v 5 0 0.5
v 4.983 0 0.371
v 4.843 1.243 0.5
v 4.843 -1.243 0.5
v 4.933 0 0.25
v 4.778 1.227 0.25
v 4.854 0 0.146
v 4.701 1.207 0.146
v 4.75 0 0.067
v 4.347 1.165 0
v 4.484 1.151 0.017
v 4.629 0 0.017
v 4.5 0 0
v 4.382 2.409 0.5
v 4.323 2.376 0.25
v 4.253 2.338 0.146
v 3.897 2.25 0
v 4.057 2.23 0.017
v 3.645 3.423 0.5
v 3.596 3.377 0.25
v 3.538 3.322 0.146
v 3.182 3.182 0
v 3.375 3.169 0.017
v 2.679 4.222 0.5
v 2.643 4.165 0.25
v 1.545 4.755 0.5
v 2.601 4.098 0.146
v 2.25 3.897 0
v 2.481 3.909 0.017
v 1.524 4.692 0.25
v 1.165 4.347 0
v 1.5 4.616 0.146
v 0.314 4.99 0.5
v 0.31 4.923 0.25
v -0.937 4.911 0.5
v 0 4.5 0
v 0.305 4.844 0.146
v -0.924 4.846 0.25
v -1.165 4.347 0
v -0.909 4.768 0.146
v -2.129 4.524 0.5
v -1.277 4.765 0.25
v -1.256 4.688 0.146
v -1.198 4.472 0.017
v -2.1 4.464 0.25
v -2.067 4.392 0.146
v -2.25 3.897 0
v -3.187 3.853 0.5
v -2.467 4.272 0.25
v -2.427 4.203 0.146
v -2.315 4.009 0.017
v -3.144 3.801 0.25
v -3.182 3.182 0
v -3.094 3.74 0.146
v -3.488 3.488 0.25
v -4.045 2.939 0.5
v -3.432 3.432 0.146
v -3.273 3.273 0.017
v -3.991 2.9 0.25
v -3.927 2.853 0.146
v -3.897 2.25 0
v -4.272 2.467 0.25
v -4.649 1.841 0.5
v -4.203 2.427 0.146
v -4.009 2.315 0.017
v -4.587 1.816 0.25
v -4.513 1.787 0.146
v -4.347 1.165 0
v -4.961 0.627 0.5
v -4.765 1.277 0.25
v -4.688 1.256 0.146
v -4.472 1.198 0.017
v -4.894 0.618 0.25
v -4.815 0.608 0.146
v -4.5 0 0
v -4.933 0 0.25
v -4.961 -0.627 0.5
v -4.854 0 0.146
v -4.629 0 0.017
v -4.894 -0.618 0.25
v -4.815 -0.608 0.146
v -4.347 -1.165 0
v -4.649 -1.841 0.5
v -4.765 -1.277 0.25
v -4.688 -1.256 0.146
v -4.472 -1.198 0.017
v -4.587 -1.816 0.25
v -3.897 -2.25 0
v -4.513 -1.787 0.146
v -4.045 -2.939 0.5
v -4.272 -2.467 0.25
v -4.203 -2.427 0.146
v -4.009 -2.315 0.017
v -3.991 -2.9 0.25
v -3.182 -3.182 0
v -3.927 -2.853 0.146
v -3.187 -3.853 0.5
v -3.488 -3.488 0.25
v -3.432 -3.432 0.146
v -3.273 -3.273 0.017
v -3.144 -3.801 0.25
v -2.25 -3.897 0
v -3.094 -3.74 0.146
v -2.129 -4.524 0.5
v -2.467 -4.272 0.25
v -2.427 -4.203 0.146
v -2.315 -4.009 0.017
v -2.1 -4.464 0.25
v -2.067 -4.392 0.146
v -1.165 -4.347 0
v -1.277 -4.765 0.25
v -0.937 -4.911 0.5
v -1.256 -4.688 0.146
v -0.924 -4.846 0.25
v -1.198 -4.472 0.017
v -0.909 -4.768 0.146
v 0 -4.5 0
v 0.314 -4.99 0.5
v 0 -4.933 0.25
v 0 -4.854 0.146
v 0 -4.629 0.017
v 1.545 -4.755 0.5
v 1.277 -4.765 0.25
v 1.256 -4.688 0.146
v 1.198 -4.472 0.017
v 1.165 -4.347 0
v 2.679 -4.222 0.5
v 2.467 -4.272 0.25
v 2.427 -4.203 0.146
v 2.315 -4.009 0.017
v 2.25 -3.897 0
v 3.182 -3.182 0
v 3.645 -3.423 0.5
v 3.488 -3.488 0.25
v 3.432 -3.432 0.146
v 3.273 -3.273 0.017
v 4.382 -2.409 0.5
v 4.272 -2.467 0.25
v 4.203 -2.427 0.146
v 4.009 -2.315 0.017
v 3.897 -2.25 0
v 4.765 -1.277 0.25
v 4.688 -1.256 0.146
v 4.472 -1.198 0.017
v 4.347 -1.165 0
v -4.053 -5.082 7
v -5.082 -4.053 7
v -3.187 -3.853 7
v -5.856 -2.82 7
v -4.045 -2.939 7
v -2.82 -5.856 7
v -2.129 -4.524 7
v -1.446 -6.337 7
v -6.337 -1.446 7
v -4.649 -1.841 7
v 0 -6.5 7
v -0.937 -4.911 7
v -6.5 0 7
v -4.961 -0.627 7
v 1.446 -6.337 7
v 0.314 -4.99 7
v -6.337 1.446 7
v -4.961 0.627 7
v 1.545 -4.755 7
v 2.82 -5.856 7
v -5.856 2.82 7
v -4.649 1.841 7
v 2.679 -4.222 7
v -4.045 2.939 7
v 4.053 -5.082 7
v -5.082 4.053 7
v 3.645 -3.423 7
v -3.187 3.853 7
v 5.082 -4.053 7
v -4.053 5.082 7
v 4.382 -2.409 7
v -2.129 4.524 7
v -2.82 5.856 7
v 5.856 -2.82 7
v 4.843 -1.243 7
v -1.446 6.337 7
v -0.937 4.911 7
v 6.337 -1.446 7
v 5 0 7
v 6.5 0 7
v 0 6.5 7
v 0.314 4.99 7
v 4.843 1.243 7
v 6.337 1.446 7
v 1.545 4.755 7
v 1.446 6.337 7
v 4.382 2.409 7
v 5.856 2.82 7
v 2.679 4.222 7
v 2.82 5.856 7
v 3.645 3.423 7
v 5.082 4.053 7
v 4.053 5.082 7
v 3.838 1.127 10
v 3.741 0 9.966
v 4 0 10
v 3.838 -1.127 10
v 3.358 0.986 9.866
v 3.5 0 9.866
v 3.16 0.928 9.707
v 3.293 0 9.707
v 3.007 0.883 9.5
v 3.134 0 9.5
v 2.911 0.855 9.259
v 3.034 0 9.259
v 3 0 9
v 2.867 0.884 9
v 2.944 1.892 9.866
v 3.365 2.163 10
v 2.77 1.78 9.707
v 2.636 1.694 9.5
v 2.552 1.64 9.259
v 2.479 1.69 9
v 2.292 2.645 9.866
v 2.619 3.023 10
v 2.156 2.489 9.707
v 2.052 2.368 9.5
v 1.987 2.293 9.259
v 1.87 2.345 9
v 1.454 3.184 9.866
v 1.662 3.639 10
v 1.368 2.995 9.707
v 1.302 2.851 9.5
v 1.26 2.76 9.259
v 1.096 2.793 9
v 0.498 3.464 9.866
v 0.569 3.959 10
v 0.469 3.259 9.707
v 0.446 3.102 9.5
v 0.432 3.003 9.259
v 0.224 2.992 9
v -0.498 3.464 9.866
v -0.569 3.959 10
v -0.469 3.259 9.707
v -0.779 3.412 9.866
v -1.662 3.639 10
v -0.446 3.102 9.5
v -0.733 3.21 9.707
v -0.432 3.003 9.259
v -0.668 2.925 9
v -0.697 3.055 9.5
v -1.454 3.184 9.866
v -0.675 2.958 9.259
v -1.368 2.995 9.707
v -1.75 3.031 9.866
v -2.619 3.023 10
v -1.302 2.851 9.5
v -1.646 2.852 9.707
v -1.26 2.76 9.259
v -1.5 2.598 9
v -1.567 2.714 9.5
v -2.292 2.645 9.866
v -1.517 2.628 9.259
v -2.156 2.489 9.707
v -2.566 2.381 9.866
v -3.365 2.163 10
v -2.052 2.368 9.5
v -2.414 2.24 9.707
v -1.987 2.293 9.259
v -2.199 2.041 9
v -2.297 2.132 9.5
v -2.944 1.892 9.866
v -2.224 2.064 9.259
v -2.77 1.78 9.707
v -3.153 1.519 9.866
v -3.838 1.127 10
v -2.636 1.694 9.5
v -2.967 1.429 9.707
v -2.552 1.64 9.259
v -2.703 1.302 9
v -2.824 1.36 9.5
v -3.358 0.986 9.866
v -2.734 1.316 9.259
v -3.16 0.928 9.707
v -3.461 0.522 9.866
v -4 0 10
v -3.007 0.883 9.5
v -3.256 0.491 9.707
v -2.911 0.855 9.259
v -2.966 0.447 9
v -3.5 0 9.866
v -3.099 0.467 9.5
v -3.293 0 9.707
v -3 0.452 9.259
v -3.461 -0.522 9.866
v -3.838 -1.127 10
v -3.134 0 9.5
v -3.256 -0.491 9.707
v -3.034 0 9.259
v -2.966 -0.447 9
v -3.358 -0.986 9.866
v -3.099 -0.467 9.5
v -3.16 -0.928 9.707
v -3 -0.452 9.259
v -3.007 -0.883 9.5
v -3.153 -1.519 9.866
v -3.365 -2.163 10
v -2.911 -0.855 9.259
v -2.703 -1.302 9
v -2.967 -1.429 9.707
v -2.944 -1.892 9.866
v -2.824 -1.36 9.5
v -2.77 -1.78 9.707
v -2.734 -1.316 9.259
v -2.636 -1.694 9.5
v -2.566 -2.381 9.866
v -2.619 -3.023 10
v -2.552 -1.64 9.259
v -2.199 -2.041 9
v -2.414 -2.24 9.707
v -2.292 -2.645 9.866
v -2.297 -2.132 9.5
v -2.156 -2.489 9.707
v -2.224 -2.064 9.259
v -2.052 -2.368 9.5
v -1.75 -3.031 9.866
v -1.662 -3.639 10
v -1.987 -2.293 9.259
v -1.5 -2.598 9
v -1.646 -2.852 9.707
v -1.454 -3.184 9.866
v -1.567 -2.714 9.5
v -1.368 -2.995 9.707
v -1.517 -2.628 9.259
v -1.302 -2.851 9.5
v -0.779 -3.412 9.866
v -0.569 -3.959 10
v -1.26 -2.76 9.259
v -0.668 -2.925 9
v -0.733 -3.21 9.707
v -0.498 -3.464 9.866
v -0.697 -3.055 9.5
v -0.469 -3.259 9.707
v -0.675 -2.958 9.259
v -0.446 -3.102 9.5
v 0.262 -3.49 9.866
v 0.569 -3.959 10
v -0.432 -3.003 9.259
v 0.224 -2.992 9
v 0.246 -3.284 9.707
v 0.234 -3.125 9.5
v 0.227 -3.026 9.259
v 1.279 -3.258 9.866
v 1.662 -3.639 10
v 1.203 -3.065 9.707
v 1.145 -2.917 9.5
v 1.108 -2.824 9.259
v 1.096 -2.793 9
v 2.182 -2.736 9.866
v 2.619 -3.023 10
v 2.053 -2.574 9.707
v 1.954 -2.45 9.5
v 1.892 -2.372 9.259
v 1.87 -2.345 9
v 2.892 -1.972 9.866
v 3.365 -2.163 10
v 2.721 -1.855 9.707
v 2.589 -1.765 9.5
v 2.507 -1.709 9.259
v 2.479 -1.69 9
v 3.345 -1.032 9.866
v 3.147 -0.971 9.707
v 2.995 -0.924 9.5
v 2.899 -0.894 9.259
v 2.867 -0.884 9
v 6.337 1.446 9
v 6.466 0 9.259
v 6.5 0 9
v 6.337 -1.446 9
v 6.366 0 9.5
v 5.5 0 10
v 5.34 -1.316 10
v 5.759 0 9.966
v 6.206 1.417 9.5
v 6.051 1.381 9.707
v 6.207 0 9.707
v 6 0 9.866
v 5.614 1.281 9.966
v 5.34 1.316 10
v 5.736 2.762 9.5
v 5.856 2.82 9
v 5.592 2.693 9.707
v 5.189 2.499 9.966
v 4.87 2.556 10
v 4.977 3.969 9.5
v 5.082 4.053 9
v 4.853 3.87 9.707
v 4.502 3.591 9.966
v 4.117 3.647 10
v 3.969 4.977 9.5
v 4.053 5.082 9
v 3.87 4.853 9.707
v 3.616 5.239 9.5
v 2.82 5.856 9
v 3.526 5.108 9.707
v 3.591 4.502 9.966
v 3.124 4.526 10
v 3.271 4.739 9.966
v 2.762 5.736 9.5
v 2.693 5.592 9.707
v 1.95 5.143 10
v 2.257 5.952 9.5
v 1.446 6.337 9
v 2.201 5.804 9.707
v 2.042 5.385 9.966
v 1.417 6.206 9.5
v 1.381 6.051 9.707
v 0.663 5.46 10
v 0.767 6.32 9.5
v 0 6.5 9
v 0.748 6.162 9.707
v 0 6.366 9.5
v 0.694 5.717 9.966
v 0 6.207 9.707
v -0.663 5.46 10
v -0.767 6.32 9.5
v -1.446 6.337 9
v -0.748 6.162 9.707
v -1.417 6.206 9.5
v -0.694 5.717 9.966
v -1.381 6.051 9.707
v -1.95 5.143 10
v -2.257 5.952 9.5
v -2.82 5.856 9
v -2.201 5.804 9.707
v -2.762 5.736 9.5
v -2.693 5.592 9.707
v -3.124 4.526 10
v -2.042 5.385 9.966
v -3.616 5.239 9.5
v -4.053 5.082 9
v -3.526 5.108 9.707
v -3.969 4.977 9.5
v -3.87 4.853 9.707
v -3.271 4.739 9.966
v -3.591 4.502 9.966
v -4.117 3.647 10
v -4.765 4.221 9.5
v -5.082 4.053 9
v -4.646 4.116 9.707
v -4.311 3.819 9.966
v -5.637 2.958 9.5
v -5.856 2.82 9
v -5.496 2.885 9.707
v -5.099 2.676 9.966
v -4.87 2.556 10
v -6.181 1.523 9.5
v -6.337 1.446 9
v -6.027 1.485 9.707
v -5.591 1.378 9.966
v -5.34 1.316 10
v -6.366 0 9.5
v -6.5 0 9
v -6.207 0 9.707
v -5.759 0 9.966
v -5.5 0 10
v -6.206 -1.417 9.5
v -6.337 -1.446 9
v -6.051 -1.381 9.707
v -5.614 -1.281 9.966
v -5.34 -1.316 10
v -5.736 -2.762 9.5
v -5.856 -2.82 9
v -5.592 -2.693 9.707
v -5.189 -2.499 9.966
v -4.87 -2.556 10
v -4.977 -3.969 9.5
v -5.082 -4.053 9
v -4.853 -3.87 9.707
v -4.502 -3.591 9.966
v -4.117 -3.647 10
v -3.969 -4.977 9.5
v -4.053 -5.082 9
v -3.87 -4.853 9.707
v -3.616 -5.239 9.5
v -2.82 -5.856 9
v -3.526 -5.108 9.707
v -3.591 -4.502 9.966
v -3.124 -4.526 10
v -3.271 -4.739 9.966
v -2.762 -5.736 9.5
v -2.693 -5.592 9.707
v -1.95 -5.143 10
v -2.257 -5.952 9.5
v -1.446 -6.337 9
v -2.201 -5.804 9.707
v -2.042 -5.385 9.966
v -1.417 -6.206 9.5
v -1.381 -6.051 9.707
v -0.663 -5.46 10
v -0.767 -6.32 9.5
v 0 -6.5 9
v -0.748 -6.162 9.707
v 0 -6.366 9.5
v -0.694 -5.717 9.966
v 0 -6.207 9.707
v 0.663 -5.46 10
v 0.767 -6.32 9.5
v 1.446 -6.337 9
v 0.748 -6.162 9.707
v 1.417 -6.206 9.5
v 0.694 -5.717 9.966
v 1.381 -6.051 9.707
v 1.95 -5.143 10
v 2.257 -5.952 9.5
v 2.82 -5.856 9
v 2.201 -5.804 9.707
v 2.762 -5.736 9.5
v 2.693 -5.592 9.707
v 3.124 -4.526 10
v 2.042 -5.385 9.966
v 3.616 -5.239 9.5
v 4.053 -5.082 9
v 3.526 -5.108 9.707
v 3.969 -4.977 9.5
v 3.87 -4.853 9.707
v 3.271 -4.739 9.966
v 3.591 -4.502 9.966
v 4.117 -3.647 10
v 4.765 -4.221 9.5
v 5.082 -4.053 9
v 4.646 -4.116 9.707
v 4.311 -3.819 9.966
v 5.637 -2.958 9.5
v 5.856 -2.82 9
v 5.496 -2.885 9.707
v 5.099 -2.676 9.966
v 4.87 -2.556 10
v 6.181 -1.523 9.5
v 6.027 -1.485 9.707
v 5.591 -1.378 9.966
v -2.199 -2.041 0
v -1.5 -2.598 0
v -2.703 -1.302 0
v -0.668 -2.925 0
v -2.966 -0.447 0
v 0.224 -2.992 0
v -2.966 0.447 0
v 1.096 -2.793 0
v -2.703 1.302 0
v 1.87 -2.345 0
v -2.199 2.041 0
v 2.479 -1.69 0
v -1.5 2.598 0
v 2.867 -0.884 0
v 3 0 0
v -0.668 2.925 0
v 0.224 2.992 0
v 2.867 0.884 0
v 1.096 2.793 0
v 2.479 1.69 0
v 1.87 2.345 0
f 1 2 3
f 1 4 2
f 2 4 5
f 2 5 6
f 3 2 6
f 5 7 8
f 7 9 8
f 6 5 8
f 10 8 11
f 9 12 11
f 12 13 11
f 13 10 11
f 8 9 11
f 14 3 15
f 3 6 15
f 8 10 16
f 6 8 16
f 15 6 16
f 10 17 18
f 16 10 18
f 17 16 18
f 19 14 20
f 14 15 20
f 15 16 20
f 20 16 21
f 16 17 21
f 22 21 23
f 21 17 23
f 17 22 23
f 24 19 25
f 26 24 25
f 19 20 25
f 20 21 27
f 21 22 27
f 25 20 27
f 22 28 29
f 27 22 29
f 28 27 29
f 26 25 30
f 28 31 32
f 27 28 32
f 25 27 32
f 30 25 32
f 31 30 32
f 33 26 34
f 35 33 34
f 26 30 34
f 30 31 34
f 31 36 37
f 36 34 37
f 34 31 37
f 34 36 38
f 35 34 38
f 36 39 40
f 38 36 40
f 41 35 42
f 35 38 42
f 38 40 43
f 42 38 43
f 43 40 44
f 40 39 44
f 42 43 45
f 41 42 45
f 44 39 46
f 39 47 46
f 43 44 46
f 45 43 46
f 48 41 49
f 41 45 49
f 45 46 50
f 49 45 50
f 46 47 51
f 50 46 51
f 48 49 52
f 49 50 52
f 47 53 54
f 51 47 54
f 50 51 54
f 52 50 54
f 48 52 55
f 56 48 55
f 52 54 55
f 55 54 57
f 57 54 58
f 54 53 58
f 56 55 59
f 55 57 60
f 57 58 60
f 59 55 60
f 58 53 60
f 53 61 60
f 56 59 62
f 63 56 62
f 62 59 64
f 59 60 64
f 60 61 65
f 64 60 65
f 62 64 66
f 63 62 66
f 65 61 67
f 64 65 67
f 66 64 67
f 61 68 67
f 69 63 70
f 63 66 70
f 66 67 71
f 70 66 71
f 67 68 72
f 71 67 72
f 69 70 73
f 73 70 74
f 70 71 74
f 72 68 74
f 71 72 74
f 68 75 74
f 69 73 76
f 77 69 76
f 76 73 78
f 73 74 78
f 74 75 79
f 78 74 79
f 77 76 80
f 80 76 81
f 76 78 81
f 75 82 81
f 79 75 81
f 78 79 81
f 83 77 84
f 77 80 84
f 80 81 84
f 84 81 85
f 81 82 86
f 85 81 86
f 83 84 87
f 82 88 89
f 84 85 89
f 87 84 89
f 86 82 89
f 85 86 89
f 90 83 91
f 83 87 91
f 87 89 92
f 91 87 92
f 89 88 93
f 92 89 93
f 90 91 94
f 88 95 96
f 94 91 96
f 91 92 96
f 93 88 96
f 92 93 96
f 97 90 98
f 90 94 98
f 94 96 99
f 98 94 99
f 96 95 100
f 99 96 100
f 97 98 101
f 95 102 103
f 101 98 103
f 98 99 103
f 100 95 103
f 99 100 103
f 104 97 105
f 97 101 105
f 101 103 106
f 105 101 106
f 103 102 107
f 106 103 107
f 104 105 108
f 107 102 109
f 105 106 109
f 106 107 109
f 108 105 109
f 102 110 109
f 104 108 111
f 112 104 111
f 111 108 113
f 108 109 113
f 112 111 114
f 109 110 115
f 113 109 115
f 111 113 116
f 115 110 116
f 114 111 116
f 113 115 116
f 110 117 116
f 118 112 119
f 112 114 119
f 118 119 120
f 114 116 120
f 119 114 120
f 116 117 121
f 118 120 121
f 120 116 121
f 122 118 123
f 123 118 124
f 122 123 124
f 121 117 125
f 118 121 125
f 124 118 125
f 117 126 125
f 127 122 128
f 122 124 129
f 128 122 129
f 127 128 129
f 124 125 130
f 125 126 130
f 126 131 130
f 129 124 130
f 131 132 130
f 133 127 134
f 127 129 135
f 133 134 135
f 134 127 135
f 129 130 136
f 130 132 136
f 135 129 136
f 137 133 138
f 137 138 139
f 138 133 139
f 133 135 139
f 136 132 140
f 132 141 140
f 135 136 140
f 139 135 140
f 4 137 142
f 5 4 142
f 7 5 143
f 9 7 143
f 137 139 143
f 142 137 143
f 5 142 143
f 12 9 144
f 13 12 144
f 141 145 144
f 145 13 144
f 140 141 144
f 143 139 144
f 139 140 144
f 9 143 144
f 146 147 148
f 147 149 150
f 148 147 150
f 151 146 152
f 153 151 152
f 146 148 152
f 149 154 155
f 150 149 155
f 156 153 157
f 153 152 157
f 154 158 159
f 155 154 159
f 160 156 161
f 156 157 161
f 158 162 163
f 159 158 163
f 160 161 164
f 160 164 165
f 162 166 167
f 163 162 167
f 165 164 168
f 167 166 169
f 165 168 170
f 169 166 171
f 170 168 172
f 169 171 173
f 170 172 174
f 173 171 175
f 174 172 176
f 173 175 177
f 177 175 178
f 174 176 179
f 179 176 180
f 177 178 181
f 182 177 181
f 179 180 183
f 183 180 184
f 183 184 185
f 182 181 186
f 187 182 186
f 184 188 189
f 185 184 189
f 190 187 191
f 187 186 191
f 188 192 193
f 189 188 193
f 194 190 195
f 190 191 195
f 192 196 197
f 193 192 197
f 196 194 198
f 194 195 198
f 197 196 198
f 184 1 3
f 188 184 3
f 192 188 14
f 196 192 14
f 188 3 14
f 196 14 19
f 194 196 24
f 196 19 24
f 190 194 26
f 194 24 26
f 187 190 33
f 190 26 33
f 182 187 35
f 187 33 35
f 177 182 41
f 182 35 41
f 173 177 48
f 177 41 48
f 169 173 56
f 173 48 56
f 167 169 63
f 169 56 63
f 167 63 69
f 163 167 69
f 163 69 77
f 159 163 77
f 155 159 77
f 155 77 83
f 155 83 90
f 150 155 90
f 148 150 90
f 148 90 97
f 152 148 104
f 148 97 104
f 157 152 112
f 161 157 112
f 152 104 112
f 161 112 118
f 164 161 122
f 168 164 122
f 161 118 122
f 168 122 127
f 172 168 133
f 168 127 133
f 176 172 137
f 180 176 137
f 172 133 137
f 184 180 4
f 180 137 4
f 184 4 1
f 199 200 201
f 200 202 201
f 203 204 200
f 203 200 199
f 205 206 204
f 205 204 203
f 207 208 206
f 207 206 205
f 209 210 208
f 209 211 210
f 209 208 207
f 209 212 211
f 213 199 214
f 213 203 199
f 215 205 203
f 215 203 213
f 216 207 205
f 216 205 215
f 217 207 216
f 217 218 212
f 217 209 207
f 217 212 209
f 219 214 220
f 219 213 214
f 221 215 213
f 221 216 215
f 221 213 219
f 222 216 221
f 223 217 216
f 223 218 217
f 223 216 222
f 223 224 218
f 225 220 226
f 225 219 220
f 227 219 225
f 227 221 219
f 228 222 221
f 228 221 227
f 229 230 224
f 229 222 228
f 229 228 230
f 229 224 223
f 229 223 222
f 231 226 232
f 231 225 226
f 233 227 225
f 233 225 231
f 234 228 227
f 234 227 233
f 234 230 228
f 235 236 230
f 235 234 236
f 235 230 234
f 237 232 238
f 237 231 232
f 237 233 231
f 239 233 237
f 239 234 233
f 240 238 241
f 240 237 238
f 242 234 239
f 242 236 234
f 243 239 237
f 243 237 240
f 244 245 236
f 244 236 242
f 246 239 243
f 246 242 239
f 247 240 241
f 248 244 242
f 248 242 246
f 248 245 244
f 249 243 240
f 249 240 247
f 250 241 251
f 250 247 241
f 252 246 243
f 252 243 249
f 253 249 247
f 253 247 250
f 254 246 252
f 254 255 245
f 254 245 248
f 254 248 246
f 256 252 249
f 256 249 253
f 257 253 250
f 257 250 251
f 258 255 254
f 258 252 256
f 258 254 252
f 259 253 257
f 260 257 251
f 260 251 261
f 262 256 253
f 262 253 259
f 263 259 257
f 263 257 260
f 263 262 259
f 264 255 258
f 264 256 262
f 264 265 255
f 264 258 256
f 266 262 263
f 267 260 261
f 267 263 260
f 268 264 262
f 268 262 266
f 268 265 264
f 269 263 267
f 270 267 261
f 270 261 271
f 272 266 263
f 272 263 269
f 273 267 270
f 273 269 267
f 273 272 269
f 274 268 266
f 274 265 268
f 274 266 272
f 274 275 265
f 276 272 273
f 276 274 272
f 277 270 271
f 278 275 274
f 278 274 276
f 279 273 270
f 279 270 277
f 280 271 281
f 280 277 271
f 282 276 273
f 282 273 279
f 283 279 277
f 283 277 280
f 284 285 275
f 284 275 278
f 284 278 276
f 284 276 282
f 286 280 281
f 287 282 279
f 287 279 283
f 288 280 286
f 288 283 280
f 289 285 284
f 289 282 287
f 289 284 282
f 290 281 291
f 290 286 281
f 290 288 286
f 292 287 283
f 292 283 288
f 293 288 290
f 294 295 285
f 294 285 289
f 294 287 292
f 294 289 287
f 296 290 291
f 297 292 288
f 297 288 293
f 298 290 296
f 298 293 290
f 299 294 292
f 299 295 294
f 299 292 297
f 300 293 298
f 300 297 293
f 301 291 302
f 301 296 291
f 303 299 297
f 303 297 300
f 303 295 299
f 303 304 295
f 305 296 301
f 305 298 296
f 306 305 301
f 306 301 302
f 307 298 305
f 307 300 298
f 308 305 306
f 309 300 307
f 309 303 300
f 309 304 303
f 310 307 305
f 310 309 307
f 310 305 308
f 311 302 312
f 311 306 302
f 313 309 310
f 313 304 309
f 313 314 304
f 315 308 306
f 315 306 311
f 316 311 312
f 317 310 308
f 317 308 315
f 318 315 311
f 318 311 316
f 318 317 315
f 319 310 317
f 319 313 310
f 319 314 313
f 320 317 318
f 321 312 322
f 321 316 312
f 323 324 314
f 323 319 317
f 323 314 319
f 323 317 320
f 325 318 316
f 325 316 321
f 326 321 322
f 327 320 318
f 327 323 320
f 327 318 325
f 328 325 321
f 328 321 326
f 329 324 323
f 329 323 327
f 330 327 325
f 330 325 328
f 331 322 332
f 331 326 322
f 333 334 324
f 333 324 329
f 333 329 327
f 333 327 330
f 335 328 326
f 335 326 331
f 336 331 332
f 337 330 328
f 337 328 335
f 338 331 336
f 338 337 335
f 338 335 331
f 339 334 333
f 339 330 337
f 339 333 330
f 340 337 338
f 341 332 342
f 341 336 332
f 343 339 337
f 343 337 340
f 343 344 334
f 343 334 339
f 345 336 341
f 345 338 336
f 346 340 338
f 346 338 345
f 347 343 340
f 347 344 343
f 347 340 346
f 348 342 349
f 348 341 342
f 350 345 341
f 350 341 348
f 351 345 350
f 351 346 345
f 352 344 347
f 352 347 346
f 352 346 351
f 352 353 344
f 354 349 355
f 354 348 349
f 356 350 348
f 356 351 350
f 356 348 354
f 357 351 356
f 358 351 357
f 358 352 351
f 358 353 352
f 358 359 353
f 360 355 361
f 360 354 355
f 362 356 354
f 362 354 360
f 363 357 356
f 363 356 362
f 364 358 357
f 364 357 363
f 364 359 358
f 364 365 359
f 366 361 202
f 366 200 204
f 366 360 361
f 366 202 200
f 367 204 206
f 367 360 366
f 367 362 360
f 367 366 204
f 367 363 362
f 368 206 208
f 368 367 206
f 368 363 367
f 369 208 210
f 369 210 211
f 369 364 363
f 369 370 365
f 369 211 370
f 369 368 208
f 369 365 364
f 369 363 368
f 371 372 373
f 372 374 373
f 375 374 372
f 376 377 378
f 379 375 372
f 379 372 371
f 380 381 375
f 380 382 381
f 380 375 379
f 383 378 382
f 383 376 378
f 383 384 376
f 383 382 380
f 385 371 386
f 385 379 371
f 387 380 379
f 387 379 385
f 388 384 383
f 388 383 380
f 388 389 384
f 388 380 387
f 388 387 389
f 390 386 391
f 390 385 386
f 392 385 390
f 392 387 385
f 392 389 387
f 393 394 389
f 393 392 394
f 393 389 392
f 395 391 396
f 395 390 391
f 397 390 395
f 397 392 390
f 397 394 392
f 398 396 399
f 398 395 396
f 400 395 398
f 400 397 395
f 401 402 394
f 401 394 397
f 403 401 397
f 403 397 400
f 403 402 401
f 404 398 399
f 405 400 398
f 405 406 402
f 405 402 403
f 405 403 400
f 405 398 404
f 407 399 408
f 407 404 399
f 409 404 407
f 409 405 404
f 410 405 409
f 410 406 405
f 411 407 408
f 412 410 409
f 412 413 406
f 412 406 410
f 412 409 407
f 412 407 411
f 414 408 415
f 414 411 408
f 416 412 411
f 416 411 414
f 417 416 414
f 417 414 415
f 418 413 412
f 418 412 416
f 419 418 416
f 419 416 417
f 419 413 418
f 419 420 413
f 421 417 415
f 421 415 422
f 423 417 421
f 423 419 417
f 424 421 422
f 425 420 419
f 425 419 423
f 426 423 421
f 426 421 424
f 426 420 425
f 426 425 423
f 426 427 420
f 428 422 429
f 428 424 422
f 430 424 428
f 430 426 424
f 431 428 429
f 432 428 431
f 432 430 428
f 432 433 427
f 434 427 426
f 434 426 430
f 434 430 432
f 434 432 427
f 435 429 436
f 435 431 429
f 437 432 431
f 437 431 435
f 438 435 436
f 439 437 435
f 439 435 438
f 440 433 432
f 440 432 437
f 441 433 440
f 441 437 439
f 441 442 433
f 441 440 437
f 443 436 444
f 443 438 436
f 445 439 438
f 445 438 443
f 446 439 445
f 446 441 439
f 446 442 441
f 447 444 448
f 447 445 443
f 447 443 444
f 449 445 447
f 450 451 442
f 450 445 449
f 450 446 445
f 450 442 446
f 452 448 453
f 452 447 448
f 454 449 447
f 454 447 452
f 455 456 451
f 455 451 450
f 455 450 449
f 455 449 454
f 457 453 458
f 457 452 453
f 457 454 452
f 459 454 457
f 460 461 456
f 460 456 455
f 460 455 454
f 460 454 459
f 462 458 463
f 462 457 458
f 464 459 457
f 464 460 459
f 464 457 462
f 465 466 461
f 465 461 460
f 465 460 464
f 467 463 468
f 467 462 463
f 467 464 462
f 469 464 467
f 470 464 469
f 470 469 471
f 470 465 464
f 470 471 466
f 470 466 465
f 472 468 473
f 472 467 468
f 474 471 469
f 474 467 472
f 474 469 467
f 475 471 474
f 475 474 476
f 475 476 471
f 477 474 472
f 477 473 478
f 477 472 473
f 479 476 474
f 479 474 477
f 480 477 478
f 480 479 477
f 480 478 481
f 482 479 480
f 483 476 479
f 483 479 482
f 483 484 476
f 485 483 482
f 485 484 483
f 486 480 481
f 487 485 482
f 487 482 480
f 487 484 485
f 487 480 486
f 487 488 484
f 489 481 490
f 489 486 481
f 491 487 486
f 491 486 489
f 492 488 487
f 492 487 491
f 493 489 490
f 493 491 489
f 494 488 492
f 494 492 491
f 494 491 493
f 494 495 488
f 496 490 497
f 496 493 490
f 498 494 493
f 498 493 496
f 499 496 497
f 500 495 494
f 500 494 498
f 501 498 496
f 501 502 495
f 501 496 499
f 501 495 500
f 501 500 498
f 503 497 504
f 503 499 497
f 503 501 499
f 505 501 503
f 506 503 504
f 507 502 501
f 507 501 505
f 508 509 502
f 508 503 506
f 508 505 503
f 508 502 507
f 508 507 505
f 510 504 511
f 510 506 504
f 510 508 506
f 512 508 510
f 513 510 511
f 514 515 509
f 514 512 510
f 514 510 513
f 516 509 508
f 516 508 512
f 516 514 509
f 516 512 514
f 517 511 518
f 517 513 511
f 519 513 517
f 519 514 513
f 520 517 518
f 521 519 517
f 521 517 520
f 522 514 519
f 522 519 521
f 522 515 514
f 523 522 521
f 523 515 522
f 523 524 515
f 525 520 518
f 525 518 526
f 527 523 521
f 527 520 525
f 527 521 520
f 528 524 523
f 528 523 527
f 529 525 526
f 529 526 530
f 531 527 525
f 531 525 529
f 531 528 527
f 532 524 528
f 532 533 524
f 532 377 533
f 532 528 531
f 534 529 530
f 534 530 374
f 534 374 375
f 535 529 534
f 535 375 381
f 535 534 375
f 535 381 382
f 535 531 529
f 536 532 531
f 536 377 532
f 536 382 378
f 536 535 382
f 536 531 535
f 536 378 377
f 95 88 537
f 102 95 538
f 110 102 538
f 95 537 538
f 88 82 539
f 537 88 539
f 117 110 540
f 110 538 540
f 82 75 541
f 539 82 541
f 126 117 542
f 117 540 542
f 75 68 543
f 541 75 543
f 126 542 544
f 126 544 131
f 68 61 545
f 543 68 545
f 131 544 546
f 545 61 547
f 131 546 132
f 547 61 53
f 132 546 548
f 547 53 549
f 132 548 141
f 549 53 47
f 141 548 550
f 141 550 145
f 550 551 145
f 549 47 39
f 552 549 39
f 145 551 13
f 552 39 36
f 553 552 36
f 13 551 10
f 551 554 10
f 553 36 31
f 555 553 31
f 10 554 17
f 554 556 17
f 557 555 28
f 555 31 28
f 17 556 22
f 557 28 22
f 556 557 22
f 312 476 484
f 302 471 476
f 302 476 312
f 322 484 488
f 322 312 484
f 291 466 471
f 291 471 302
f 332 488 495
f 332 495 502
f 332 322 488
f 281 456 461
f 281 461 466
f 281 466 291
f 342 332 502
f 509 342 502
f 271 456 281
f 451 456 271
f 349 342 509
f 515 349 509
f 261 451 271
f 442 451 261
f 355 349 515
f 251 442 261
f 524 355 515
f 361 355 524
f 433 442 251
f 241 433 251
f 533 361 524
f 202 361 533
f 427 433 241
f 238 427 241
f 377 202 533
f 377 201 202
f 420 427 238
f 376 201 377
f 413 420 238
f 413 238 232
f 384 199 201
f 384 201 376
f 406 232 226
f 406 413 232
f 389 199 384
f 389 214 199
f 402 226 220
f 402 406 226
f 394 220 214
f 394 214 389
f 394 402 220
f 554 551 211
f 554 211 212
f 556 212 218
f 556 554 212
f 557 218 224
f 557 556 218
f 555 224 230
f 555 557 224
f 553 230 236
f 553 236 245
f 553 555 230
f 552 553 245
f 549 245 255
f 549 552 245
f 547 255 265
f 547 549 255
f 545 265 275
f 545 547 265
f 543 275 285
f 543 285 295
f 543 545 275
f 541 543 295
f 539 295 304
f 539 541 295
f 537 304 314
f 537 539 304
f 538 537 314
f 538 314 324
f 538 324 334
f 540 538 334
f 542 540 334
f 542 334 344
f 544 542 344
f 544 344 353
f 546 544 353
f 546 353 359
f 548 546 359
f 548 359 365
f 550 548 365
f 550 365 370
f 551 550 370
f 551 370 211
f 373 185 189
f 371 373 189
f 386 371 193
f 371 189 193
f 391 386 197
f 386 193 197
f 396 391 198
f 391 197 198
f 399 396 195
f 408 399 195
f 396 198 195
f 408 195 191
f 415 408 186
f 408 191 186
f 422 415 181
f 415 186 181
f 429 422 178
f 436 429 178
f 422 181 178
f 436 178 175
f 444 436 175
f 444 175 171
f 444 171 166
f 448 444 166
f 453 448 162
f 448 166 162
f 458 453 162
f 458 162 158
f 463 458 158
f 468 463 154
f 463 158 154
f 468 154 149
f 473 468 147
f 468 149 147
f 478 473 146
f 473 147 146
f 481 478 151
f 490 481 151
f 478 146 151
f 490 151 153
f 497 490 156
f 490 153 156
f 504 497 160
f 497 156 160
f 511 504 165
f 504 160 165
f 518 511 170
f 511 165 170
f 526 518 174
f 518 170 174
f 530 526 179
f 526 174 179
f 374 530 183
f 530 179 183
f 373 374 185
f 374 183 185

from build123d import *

# Parameters (mm, degrees)
SKETCH1_R           = 5
SKETCH1_R_2         = 3
BOSS_EXTRUDE1_DEPTH = 7
SKETCH2_R           = 6.5
SKETCH2_R_2         = 3
BOSS_EXTRUDE2_DEPTH = 3
FILLET1_R           = 1
FILLET2_R           = 0.5


with BuildPart() as part:
    # Sketch1 → Boss-Extrude1 (new body)
    with BuildSketch(Plane.XY):
        Circle(SKETCH1_R)
        Circle(SKETCH1_R_2, mode=Mode.SUBTRACT)
    extrude(amount=BOSS_EXTRUDE1_DEPTH)

    # Sketch2 → Boss-Extrude2 (add)
    with BuildSketch(Plane.XY.offset(7)):
        Circle(SKETCH2_R)
        Circle(SKETCH2_R_2, mode=Mode.SUBTRACT)
    extrude(amount=BOSS_EXTRUDE2_DEPTH)

    # Fillet1
    fillet1_edges = [part.edges().sort_by_distance(p)[0] for p in [
        (-6.5, 0, 10),
        (-3, 0, 10),
    ]]
    fillet(fillet1_edges, radius=FILLET1_R)

    # Fillet2
    fillet2_edges = [part.edges().sort_by_distance(p)[0] for p in [
        (-5, 0, 0),
    ]]
    fillet(fillet2_edges, radius=FILLET2_R)


solid = part.part
